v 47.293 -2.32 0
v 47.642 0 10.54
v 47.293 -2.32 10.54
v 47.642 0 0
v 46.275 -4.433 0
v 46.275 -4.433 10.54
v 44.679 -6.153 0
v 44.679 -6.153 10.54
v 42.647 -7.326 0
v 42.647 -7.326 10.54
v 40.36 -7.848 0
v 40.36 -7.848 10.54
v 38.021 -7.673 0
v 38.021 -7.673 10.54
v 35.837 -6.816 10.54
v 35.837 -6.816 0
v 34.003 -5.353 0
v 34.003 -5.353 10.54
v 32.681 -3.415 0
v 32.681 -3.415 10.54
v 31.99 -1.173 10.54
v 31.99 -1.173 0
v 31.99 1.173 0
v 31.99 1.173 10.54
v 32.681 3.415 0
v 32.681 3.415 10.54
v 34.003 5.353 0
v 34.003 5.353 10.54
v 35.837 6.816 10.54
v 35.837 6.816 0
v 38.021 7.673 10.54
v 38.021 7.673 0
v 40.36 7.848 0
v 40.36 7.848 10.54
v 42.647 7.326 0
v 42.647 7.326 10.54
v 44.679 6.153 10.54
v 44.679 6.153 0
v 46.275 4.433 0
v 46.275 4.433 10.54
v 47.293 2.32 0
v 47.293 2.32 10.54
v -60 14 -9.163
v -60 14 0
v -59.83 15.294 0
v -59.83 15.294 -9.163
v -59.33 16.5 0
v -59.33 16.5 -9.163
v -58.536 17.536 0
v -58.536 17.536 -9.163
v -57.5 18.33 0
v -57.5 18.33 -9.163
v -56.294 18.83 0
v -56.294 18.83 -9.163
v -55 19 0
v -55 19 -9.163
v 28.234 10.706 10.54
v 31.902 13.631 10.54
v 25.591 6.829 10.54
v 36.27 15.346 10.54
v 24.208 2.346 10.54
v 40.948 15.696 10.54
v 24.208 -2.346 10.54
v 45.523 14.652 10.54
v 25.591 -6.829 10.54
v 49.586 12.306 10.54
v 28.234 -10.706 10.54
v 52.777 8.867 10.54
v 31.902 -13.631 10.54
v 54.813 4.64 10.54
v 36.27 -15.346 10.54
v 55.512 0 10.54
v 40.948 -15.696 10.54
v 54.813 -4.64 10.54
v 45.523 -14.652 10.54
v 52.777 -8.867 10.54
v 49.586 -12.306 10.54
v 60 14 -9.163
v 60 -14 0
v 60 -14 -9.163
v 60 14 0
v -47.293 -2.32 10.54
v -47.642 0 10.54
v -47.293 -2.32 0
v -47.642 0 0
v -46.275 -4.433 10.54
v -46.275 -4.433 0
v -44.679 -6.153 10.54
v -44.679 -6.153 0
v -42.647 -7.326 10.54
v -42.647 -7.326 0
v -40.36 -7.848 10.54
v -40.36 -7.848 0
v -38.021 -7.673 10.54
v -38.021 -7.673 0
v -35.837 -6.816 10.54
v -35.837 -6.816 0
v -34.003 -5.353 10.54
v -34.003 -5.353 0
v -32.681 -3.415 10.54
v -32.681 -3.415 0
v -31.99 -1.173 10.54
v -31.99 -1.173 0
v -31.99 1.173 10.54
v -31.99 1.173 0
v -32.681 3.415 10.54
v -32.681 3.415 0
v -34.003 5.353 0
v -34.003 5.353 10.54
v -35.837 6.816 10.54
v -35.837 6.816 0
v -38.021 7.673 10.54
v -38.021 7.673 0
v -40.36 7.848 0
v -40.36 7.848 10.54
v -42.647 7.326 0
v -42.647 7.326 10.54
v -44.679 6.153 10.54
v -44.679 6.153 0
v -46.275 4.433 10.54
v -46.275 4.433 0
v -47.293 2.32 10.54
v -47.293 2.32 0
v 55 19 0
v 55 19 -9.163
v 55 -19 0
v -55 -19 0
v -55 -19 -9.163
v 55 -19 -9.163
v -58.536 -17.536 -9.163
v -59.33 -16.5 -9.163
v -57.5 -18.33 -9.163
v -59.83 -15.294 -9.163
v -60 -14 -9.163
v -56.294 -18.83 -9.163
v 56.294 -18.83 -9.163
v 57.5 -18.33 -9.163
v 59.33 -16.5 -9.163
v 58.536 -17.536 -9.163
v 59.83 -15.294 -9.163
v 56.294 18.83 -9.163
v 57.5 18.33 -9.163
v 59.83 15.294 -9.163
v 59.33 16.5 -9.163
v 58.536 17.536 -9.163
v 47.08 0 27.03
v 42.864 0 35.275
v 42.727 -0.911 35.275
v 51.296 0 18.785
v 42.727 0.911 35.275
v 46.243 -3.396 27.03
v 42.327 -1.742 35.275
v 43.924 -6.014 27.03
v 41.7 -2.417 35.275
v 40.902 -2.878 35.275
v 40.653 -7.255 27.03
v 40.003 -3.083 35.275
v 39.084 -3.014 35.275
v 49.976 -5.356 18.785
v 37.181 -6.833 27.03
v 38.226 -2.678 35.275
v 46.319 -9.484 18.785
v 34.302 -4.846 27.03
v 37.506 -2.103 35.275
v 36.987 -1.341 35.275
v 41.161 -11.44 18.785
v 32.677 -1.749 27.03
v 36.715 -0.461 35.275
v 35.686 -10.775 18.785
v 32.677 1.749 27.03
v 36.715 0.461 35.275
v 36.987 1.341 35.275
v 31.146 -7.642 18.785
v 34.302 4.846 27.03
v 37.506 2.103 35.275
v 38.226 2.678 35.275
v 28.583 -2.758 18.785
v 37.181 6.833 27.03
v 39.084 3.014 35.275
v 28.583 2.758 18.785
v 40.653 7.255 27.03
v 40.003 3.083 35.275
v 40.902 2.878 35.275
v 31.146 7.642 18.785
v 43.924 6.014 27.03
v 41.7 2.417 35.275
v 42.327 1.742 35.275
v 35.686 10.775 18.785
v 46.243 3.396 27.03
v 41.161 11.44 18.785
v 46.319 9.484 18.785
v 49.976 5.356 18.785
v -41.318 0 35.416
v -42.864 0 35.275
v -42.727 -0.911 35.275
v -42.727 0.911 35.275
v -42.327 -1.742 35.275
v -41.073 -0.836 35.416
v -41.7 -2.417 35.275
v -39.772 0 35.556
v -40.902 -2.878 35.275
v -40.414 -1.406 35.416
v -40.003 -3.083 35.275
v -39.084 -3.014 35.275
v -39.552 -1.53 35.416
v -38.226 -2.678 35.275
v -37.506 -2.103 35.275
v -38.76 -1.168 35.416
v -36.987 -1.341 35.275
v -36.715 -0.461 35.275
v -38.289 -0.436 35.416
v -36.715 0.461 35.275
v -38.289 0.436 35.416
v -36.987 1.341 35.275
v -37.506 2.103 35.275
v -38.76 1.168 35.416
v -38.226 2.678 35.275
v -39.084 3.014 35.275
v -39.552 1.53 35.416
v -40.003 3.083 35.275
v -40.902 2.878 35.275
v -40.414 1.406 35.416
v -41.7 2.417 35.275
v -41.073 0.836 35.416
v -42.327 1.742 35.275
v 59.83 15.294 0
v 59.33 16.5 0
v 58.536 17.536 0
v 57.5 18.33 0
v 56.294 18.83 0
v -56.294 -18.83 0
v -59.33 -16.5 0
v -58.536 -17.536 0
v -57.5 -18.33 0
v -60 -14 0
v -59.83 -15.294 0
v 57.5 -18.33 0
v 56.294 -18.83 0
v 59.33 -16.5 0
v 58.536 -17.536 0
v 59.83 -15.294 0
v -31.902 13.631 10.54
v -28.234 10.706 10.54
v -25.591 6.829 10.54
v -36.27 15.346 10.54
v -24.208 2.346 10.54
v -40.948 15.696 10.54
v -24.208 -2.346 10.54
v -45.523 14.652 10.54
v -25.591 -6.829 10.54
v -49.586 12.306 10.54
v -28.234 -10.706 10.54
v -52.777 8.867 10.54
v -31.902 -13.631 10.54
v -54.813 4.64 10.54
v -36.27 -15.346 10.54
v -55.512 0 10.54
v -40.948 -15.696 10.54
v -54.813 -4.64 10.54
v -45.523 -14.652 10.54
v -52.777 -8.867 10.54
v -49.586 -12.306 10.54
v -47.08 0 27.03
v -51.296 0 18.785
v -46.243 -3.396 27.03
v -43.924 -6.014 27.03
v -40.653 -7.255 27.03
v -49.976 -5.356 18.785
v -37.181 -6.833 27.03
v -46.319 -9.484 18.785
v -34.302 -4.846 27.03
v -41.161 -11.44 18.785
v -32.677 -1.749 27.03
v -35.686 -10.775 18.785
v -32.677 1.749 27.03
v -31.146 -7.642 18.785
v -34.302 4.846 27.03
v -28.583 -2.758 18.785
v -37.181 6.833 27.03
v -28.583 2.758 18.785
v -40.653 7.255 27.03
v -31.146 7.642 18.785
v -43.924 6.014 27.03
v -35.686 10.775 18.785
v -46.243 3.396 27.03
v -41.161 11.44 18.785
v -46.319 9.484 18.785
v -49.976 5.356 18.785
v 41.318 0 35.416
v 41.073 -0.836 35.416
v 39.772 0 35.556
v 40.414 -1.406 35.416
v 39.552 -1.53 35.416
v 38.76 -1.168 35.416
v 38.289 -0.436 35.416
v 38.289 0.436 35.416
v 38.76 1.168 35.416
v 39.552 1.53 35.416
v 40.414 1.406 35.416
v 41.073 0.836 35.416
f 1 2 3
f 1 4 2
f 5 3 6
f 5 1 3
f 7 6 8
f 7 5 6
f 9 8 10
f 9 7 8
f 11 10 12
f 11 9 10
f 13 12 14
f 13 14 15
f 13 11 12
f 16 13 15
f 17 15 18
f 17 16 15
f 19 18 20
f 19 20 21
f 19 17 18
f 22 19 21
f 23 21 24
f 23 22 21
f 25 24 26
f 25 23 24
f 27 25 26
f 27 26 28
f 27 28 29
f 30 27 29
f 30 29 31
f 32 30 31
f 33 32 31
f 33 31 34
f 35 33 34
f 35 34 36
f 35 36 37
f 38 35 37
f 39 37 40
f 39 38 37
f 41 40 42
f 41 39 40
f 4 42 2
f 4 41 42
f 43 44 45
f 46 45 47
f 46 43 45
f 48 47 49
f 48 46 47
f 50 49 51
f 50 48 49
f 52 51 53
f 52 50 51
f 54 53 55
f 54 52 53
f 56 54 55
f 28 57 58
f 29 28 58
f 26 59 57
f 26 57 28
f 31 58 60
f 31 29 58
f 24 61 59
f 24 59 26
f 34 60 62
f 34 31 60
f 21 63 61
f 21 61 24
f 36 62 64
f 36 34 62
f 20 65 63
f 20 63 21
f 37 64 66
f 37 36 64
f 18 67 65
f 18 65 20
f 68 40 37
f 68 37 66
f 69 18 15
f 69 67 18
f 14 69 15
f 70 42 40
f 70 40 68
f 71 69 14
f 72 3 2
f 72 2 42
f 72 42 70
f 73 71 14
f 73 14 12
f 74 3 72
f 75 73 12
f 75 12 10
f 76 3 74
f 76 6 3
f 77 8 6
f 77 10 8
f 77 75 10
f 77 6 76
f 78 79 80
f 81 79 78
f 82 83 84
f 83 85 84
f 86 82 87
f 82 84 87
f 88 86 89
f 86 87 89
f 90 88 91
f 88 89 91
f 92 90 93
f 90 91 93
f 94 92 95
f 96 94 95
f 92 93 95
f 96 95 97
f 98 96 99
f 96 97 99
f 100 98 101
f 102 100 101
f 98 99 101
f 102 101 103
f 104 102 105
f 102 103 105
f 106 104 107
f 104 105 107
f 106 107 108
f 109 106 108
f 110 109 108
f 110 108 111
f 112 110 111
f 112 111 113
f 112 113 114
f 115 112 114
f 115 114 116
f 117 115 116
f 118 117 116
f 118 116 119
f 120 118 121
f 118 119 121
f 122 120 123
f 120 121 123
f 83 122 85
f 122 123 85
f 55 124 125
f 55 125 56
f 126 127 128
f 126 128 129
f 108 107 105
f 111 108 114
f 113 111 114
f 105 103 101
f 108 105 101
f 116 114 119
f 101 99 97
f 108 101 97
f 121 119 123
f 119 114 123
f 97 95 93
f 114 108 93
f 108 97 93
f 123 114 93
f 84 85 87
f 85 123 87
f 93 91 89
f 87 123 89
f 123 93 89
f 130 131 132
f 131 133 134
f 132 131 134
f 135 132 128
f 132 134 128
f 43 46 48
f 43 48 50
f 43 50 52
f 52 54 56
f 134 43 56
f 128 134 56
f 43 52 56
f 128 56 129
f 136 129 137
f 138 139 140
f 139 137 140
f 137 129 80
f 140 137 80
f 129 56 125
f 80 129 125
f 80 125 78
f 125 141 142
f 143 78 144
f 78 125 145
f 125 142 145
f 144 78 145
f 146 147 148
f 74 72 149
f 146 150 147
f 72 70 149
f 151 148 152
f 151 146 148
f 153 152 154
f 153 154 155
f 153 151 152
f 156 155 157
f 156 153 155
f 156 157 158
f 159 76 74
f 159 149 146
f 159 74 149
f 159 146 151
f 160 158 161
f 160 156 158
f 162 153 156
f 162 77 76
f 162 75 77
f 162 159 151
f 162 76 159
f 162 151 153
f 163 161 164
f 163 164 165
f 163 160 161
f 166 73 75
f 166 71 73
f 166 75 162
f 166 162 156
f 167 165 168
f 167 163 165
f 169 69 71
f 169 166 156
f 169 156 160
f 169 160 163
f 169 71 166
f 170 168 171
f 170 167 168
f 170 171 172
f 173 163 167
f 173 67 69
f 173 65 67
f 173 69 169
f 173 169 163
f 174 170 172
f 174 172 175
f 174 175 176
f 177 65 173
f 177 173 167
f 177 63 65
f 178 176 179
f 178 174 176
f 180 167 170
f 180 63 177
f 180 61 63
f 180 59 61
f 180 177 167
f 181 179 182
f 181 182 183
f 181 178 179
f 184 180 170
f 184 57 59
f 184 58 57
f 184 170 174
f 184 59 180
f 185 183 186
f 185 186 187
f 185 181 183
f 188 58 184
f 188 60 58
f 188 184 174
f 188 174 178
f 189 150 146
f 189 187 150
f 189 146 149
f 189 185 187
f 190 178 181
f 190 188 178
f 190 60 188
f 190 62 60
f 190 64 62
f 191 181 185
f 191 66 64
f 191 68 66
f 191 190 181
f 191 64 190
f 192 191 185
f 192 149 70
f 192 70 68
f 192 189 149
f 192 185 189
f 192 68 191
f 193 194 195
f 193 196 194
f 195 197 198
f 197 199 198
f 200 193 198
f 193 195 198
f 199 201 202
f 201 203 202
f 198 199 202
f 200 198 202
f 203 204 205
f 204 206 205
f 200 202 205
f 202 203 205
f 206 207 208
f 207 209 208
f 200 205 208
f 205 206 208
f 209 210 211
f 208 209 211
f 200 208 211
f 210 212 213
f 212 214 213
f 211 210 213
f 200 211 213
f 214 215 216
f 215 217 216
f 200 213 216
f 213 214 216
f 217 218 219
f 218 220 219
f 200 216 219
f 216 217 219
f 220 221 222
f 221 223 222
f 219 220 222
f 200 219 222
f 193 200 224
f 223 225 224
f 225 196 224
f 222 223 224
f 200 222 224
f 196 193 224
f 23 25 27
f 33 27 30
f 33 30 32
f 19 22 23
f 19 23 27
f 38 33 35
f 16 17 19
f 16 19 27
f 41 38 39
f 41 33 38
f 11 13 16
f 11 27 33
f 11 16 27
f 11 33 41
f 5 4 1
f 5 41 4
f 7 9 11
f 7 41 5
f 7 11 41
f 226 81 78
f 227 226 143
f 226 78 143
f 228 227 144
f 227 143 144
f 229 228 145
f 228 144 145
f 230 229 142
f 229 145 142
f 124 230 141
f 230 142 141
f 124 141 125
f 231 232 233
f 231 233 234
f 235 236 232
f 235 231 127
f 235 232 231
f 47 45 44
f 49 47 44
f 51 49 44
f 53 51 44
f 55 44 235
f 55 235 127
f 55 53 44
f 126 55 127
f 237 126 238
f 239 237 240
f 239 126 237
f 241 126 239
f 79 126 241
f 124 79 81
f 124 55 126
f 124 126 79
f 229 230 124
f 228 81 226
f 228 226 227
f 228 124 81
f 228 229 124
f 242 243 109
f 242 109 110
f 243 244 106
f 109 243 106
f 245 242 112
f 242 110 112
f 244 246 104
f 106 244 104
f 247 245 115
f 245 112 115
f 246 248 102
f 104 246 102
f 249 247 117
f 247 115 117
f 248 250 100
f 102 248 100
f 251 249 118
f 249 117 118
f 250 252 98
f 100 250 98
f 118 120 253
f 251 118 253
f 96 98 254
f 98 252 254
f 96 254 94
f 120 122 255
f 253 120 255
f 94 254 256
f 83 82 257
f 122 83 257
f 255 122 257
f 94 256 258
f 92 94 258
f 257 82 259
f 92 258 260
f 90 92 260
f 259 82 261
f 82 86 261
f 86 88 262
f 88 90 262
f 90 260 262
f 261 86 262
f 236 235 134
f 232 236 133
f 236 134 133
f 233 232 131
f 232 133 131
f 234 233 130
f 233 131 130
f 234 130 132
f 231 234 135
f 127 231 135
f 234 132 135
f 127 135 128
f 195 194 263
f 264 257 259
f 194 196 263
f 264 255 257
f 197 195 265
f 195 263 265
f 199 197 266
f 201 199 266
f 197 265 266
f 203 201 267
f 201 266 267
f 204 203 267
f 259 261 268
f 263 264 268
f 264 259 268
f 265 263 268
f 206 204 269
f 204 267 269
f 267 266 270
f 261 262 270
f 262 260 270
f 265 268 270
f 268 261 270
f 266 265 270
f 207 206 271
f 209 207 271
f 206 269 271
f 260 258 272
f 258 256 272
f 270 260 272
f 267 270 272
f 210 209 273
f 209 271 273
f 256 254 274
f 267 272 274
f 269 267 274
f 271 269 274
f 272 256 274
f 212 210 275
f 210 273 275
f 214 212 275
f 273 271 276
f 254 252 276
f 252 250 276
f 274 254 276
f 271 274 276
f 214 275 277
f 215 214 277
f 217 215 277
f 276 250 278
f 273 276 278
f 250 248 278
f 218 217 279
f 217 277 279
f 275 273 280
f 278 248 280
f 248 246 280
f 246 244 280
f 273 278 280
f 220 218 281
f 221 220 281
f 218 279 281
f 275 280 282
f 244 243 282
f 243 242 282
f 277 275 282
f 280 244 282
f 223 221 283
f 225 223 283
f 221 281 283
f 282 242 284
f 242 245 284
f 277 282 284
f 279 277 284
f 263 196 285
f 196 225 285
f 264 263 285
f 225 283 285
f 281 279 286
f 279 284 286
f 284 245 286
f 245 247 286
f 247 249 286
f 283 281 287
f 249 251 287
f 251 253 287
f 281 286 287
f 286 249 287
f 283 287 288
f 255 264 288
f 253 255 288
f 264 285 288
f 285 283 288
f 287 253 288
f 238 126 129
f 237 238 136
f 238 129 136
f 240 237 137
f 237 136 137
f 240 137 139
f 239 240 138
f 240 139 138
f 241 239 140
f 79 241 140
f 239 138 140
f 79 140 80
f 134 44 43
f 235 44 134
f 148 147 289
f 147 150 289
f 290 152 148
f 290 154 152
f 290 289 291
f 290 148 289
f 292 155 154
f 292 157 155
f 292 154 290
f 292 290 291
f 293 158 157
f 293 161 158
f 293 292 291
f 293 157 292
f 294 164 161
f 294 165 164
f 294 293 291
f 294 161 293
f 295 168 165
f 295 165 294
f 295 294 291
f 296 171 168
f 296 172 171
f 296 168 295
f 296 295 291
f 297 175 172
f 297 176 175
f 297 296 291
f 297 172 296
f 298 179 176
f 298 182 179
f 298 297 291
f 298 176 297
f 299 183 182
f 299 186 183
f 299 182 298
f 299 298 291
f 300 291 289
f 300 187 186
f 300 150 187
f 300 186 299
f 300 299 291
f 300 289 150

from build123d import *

# Parameters (mm, degrees)
F4_DEPTH = 21
F5_R     = 5
F7_W     = 165.3024330735
F7_H     = 19.5967741311
F8_DEPTH = 19.001
F9_DEPTH = 19.001


# Not quite as in the source:
# - a feature of the source that left no trace in its solid (it failed there, or was rolled back) is left out


with BuildPart() as f1:
    # F0 (on Front) → F1 (revolve)
    with BuildSketch(Plane.XZ):
        Polygon((-47.6422980428, 10.5403326452), (-47.6422980428, 0), (-39.772182703, 0), (-39.772182703, 35.5560481548), (-42.8640134633, 35.2749750018), (-55.5124096572, 10.5403326452), align=None)
    revolve(axis=Axis((-39.772182703, 0, 14.0533037484), (0, 0, 1)))


with BuildPart() as f2_1:
    # F2: instance of F1
    add(f1.part.mirror(Plane.YZ))


with BuildPart() as f4:
    # F3 (on Top) → F4 (new body)
    with BuildSketch(Plane.XY):
        Polygon((-60, 19), (-60, 0), (-60, -19), (60, -19), (60, 19), align=None)
    extrude(amount=-F4_DEPTH)

    # F5
    f5_edges = [f4.edges().sort_by_distance(p)[0] for p in [
        (60, -19, -10.5),
        (-60, -19, -10.5),
        (60, 19, -10.5),
        (-60, 19, -10.5),
    ]]
    fillet(f5_edges, radius=F5_R)

    # F7 (on Front) → F8 (cut, through all)
    with BuildSketch(Plane.XZ):
        with Locations((-2.3588724434, -18.9616940916)):
            Rectangle(F7_W, F7_H)
    extrude(amount=-F8_DEPTH, mode=Mode.SUBTRACT)

    # F9 (cut, through all): a face of the model
    f9_faces = [f4.faces().sort_by_distance(p)[0] for p in [
        (0, 0, -15.081653513),
    ]]
    extrude(f9_faces, amount=-F9_DEPTH, mode=Mode.SUBTRACT)


solid = Compound([f1.part, f2_1.part, f4.part])
